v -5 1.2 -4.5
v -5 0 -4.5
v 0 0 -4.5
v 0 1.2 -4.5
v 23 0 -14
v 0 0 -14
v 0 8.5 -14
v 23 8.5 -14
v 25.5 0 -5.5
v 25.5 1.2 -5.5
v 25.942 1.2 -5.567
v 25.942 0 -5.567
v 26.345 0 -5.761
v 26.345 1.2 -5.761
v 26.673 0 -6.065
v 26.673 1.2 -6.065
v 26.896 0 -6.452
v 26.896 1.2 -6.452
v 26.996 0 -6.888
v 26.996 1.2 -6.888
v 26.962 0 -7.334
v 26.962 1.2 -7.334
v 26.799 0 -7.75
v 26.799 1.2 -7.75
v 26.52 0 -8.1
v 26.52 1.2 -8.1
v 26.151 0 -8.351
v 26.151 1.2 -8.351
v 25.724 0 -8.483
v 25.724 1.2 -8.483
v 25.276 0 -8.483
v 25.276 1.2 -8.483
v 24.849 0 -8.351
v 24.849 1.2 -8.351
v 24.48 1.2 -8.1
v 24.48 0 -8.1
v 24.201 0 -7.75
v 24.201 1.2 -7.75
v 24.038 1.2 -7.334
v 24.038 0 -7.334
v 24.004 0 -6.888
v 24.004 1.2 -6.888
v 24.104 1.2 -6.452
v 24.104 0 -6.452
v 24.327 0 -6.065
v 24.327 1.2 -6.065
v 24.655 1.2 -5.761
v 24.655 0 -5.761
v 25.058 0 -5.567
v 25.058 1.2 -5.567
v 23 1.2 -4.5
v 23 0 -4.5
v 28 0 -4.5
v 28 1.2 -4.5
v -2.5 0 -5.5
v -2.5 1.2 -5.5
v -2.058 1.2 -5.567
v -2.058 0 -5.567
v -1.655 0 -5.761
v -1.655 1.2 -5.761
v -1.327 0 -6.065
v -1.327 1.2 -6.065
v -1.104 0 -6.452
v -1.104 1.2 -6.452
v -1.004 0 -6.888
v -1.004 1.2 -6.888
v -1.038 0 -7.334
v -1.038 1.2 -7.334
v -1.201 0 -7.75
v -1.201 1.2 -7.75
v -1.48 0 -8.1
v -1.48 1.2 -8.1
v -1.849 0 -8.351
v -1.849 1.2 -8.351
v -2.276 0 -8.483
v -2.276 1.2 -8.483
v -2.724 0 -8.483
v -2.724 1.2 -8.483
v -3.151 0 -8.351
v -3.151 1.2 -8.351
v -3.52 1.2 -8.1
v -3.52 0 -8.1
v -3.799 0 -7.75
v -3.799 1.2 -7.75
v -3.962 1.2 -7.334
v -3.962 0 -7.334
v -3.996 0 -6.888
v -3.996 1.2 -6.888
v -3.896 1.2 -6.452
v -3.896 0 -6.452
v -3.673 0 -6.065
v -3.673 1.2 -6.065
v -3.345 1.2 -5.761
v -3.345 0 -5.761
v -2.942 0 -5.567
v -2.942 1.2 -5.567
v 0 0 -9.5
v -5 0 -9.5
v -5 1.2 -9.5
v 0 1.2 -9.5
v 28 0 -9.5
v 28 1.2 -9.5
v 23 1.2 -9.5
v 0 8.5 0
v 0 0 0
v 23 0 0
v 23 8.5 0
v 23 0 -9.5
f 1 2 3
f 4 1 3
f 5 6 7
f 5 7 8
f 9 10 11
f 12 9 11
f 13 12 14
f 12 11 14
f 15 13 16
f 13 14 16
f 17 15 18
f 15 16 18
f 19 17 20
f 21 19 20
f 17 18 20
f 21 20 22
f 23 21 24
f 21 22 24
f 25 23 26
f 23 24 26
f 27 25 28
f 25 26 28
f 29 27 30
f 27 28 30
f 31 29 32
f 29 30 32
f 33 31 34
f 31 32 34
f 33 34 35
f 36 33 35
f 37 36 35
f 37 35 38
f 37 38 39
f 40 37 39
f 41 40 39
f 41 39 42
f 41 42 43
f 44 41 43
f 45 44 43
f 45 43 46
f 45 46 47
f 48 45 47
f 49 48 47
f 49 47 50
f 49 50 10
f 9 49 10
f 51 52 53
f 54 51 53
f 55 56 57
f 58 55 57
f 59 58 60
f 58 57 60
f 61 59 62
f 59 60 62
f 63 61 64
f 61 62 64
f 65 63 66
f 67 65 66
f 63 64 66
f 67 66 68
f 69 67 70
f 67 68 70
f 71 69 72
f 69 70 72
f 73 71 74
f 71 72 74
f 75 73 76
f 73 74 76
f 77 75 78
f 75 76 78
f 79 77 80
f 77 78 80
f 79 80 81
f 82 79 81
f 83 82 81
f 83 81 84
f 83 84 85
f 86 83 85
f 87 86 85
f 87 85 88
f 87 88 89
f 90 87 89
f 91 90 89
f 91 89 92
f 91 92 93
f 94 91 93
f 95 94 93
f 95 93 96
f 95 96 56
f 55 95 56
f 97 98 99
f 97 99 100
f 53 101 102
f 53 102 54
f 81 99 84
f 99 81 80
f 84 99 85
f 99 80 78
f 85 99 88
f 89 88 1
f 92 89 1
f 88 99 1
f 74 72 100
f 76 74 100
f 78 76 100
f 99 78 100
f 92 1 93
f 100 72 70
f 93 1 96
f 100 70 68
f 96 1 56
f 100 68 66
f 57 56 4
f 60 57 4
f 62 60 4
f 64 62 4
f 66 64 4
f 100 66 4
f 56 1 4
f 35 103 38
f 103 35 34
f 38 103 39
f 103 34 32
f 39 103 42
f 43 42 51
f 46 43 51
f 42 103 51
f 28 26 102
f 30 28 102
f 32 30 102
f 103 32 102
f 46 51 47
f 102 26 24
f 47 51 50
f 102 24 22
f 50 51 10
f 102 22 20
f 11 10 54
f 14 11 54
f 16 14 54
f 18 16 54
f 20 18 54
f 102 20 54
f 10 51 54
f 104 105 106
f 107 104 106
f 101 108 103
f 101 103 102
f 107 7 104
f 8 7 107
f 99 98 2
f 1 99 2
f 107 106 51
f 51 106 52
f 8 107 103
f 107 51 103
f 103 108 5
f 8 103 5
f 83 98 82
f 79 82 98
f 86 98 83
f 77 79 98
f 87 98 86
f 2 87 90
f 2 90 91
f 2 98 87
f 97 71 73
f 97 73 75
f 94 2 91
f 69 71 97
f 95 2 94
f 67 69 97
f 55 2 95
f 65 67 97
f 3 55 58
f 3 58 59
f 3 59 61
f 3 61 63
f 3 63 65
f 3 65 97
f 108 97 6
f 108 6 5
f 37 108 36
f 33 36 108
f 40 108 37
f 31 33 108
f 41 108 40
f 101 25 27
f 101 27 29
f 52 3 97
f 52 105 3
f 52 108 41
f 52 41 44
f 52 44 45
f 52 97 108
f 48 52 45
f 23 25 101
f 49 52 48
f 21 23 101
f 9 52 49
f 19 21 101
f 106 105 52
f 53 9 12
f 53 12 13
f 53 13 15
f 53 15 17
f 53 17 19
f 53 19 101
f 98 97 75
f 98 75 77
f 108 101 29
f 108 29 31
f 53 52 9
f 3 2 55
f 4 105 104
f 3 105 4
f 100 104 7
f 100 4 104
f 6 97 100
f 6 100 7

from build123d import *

# Parameters (mm, degrees)
SKETCH1_W           = 23
SKETCH1_H           = 14
BOSS_EXTRUDE1_DEPTH = 8.5
SKETCH2_W           = 33
SKETCH2_H           = 5
BOSS_EXTRUDE2_DEPTH = 1.2
SKETCH3_R           = 1.5
CUT_EXTRUDE1_DEPTH  = 10


with BuildPart() as part:
    # Sketch1 → Boss-Extrude1 (new body)
    with BuildSketch(Plane(origin=(0, 0, 0), x_dir=(1, 0, 0), z_dir=(0, 1, 0))):
        with Locations((11.5, 7)):
            Rectangle(SKETCH1_W, SKETCH1_H)
    extrude(amount=BOSS_EXTRUDE1_DEPTH)

    # Sketch2 → Boss-Extrude2 (add)
    with BuildSketch(Plane.XZ):
        with Locations((11.5, -7)):
            Rectangle(SKETCH2_W, SKETCH2_H)
    extrude(amount=-BOSS_EXTRUDE2_DEPTH)

    # Sketch3 → Cut-Extrude1 (cut)
    with BuildSketch(Plane(origin=(0, 1.2, 0), x_dir=(1, 0, 0), z_dir=(0, 1, 0))):
        with Locations(Location((-2.5, 7, 0), (0, 0, 270))):
            Circle(SKETCH3_R)
        with Locations(Location((25.5, 7, 0), (0, 0, 270))):
            Circle(SKETCH3_R)
    extrude(amount=-CUT_EXTRUDE1_DEPTH, mode=Mode.SUBTRACT)


solid = part.part
